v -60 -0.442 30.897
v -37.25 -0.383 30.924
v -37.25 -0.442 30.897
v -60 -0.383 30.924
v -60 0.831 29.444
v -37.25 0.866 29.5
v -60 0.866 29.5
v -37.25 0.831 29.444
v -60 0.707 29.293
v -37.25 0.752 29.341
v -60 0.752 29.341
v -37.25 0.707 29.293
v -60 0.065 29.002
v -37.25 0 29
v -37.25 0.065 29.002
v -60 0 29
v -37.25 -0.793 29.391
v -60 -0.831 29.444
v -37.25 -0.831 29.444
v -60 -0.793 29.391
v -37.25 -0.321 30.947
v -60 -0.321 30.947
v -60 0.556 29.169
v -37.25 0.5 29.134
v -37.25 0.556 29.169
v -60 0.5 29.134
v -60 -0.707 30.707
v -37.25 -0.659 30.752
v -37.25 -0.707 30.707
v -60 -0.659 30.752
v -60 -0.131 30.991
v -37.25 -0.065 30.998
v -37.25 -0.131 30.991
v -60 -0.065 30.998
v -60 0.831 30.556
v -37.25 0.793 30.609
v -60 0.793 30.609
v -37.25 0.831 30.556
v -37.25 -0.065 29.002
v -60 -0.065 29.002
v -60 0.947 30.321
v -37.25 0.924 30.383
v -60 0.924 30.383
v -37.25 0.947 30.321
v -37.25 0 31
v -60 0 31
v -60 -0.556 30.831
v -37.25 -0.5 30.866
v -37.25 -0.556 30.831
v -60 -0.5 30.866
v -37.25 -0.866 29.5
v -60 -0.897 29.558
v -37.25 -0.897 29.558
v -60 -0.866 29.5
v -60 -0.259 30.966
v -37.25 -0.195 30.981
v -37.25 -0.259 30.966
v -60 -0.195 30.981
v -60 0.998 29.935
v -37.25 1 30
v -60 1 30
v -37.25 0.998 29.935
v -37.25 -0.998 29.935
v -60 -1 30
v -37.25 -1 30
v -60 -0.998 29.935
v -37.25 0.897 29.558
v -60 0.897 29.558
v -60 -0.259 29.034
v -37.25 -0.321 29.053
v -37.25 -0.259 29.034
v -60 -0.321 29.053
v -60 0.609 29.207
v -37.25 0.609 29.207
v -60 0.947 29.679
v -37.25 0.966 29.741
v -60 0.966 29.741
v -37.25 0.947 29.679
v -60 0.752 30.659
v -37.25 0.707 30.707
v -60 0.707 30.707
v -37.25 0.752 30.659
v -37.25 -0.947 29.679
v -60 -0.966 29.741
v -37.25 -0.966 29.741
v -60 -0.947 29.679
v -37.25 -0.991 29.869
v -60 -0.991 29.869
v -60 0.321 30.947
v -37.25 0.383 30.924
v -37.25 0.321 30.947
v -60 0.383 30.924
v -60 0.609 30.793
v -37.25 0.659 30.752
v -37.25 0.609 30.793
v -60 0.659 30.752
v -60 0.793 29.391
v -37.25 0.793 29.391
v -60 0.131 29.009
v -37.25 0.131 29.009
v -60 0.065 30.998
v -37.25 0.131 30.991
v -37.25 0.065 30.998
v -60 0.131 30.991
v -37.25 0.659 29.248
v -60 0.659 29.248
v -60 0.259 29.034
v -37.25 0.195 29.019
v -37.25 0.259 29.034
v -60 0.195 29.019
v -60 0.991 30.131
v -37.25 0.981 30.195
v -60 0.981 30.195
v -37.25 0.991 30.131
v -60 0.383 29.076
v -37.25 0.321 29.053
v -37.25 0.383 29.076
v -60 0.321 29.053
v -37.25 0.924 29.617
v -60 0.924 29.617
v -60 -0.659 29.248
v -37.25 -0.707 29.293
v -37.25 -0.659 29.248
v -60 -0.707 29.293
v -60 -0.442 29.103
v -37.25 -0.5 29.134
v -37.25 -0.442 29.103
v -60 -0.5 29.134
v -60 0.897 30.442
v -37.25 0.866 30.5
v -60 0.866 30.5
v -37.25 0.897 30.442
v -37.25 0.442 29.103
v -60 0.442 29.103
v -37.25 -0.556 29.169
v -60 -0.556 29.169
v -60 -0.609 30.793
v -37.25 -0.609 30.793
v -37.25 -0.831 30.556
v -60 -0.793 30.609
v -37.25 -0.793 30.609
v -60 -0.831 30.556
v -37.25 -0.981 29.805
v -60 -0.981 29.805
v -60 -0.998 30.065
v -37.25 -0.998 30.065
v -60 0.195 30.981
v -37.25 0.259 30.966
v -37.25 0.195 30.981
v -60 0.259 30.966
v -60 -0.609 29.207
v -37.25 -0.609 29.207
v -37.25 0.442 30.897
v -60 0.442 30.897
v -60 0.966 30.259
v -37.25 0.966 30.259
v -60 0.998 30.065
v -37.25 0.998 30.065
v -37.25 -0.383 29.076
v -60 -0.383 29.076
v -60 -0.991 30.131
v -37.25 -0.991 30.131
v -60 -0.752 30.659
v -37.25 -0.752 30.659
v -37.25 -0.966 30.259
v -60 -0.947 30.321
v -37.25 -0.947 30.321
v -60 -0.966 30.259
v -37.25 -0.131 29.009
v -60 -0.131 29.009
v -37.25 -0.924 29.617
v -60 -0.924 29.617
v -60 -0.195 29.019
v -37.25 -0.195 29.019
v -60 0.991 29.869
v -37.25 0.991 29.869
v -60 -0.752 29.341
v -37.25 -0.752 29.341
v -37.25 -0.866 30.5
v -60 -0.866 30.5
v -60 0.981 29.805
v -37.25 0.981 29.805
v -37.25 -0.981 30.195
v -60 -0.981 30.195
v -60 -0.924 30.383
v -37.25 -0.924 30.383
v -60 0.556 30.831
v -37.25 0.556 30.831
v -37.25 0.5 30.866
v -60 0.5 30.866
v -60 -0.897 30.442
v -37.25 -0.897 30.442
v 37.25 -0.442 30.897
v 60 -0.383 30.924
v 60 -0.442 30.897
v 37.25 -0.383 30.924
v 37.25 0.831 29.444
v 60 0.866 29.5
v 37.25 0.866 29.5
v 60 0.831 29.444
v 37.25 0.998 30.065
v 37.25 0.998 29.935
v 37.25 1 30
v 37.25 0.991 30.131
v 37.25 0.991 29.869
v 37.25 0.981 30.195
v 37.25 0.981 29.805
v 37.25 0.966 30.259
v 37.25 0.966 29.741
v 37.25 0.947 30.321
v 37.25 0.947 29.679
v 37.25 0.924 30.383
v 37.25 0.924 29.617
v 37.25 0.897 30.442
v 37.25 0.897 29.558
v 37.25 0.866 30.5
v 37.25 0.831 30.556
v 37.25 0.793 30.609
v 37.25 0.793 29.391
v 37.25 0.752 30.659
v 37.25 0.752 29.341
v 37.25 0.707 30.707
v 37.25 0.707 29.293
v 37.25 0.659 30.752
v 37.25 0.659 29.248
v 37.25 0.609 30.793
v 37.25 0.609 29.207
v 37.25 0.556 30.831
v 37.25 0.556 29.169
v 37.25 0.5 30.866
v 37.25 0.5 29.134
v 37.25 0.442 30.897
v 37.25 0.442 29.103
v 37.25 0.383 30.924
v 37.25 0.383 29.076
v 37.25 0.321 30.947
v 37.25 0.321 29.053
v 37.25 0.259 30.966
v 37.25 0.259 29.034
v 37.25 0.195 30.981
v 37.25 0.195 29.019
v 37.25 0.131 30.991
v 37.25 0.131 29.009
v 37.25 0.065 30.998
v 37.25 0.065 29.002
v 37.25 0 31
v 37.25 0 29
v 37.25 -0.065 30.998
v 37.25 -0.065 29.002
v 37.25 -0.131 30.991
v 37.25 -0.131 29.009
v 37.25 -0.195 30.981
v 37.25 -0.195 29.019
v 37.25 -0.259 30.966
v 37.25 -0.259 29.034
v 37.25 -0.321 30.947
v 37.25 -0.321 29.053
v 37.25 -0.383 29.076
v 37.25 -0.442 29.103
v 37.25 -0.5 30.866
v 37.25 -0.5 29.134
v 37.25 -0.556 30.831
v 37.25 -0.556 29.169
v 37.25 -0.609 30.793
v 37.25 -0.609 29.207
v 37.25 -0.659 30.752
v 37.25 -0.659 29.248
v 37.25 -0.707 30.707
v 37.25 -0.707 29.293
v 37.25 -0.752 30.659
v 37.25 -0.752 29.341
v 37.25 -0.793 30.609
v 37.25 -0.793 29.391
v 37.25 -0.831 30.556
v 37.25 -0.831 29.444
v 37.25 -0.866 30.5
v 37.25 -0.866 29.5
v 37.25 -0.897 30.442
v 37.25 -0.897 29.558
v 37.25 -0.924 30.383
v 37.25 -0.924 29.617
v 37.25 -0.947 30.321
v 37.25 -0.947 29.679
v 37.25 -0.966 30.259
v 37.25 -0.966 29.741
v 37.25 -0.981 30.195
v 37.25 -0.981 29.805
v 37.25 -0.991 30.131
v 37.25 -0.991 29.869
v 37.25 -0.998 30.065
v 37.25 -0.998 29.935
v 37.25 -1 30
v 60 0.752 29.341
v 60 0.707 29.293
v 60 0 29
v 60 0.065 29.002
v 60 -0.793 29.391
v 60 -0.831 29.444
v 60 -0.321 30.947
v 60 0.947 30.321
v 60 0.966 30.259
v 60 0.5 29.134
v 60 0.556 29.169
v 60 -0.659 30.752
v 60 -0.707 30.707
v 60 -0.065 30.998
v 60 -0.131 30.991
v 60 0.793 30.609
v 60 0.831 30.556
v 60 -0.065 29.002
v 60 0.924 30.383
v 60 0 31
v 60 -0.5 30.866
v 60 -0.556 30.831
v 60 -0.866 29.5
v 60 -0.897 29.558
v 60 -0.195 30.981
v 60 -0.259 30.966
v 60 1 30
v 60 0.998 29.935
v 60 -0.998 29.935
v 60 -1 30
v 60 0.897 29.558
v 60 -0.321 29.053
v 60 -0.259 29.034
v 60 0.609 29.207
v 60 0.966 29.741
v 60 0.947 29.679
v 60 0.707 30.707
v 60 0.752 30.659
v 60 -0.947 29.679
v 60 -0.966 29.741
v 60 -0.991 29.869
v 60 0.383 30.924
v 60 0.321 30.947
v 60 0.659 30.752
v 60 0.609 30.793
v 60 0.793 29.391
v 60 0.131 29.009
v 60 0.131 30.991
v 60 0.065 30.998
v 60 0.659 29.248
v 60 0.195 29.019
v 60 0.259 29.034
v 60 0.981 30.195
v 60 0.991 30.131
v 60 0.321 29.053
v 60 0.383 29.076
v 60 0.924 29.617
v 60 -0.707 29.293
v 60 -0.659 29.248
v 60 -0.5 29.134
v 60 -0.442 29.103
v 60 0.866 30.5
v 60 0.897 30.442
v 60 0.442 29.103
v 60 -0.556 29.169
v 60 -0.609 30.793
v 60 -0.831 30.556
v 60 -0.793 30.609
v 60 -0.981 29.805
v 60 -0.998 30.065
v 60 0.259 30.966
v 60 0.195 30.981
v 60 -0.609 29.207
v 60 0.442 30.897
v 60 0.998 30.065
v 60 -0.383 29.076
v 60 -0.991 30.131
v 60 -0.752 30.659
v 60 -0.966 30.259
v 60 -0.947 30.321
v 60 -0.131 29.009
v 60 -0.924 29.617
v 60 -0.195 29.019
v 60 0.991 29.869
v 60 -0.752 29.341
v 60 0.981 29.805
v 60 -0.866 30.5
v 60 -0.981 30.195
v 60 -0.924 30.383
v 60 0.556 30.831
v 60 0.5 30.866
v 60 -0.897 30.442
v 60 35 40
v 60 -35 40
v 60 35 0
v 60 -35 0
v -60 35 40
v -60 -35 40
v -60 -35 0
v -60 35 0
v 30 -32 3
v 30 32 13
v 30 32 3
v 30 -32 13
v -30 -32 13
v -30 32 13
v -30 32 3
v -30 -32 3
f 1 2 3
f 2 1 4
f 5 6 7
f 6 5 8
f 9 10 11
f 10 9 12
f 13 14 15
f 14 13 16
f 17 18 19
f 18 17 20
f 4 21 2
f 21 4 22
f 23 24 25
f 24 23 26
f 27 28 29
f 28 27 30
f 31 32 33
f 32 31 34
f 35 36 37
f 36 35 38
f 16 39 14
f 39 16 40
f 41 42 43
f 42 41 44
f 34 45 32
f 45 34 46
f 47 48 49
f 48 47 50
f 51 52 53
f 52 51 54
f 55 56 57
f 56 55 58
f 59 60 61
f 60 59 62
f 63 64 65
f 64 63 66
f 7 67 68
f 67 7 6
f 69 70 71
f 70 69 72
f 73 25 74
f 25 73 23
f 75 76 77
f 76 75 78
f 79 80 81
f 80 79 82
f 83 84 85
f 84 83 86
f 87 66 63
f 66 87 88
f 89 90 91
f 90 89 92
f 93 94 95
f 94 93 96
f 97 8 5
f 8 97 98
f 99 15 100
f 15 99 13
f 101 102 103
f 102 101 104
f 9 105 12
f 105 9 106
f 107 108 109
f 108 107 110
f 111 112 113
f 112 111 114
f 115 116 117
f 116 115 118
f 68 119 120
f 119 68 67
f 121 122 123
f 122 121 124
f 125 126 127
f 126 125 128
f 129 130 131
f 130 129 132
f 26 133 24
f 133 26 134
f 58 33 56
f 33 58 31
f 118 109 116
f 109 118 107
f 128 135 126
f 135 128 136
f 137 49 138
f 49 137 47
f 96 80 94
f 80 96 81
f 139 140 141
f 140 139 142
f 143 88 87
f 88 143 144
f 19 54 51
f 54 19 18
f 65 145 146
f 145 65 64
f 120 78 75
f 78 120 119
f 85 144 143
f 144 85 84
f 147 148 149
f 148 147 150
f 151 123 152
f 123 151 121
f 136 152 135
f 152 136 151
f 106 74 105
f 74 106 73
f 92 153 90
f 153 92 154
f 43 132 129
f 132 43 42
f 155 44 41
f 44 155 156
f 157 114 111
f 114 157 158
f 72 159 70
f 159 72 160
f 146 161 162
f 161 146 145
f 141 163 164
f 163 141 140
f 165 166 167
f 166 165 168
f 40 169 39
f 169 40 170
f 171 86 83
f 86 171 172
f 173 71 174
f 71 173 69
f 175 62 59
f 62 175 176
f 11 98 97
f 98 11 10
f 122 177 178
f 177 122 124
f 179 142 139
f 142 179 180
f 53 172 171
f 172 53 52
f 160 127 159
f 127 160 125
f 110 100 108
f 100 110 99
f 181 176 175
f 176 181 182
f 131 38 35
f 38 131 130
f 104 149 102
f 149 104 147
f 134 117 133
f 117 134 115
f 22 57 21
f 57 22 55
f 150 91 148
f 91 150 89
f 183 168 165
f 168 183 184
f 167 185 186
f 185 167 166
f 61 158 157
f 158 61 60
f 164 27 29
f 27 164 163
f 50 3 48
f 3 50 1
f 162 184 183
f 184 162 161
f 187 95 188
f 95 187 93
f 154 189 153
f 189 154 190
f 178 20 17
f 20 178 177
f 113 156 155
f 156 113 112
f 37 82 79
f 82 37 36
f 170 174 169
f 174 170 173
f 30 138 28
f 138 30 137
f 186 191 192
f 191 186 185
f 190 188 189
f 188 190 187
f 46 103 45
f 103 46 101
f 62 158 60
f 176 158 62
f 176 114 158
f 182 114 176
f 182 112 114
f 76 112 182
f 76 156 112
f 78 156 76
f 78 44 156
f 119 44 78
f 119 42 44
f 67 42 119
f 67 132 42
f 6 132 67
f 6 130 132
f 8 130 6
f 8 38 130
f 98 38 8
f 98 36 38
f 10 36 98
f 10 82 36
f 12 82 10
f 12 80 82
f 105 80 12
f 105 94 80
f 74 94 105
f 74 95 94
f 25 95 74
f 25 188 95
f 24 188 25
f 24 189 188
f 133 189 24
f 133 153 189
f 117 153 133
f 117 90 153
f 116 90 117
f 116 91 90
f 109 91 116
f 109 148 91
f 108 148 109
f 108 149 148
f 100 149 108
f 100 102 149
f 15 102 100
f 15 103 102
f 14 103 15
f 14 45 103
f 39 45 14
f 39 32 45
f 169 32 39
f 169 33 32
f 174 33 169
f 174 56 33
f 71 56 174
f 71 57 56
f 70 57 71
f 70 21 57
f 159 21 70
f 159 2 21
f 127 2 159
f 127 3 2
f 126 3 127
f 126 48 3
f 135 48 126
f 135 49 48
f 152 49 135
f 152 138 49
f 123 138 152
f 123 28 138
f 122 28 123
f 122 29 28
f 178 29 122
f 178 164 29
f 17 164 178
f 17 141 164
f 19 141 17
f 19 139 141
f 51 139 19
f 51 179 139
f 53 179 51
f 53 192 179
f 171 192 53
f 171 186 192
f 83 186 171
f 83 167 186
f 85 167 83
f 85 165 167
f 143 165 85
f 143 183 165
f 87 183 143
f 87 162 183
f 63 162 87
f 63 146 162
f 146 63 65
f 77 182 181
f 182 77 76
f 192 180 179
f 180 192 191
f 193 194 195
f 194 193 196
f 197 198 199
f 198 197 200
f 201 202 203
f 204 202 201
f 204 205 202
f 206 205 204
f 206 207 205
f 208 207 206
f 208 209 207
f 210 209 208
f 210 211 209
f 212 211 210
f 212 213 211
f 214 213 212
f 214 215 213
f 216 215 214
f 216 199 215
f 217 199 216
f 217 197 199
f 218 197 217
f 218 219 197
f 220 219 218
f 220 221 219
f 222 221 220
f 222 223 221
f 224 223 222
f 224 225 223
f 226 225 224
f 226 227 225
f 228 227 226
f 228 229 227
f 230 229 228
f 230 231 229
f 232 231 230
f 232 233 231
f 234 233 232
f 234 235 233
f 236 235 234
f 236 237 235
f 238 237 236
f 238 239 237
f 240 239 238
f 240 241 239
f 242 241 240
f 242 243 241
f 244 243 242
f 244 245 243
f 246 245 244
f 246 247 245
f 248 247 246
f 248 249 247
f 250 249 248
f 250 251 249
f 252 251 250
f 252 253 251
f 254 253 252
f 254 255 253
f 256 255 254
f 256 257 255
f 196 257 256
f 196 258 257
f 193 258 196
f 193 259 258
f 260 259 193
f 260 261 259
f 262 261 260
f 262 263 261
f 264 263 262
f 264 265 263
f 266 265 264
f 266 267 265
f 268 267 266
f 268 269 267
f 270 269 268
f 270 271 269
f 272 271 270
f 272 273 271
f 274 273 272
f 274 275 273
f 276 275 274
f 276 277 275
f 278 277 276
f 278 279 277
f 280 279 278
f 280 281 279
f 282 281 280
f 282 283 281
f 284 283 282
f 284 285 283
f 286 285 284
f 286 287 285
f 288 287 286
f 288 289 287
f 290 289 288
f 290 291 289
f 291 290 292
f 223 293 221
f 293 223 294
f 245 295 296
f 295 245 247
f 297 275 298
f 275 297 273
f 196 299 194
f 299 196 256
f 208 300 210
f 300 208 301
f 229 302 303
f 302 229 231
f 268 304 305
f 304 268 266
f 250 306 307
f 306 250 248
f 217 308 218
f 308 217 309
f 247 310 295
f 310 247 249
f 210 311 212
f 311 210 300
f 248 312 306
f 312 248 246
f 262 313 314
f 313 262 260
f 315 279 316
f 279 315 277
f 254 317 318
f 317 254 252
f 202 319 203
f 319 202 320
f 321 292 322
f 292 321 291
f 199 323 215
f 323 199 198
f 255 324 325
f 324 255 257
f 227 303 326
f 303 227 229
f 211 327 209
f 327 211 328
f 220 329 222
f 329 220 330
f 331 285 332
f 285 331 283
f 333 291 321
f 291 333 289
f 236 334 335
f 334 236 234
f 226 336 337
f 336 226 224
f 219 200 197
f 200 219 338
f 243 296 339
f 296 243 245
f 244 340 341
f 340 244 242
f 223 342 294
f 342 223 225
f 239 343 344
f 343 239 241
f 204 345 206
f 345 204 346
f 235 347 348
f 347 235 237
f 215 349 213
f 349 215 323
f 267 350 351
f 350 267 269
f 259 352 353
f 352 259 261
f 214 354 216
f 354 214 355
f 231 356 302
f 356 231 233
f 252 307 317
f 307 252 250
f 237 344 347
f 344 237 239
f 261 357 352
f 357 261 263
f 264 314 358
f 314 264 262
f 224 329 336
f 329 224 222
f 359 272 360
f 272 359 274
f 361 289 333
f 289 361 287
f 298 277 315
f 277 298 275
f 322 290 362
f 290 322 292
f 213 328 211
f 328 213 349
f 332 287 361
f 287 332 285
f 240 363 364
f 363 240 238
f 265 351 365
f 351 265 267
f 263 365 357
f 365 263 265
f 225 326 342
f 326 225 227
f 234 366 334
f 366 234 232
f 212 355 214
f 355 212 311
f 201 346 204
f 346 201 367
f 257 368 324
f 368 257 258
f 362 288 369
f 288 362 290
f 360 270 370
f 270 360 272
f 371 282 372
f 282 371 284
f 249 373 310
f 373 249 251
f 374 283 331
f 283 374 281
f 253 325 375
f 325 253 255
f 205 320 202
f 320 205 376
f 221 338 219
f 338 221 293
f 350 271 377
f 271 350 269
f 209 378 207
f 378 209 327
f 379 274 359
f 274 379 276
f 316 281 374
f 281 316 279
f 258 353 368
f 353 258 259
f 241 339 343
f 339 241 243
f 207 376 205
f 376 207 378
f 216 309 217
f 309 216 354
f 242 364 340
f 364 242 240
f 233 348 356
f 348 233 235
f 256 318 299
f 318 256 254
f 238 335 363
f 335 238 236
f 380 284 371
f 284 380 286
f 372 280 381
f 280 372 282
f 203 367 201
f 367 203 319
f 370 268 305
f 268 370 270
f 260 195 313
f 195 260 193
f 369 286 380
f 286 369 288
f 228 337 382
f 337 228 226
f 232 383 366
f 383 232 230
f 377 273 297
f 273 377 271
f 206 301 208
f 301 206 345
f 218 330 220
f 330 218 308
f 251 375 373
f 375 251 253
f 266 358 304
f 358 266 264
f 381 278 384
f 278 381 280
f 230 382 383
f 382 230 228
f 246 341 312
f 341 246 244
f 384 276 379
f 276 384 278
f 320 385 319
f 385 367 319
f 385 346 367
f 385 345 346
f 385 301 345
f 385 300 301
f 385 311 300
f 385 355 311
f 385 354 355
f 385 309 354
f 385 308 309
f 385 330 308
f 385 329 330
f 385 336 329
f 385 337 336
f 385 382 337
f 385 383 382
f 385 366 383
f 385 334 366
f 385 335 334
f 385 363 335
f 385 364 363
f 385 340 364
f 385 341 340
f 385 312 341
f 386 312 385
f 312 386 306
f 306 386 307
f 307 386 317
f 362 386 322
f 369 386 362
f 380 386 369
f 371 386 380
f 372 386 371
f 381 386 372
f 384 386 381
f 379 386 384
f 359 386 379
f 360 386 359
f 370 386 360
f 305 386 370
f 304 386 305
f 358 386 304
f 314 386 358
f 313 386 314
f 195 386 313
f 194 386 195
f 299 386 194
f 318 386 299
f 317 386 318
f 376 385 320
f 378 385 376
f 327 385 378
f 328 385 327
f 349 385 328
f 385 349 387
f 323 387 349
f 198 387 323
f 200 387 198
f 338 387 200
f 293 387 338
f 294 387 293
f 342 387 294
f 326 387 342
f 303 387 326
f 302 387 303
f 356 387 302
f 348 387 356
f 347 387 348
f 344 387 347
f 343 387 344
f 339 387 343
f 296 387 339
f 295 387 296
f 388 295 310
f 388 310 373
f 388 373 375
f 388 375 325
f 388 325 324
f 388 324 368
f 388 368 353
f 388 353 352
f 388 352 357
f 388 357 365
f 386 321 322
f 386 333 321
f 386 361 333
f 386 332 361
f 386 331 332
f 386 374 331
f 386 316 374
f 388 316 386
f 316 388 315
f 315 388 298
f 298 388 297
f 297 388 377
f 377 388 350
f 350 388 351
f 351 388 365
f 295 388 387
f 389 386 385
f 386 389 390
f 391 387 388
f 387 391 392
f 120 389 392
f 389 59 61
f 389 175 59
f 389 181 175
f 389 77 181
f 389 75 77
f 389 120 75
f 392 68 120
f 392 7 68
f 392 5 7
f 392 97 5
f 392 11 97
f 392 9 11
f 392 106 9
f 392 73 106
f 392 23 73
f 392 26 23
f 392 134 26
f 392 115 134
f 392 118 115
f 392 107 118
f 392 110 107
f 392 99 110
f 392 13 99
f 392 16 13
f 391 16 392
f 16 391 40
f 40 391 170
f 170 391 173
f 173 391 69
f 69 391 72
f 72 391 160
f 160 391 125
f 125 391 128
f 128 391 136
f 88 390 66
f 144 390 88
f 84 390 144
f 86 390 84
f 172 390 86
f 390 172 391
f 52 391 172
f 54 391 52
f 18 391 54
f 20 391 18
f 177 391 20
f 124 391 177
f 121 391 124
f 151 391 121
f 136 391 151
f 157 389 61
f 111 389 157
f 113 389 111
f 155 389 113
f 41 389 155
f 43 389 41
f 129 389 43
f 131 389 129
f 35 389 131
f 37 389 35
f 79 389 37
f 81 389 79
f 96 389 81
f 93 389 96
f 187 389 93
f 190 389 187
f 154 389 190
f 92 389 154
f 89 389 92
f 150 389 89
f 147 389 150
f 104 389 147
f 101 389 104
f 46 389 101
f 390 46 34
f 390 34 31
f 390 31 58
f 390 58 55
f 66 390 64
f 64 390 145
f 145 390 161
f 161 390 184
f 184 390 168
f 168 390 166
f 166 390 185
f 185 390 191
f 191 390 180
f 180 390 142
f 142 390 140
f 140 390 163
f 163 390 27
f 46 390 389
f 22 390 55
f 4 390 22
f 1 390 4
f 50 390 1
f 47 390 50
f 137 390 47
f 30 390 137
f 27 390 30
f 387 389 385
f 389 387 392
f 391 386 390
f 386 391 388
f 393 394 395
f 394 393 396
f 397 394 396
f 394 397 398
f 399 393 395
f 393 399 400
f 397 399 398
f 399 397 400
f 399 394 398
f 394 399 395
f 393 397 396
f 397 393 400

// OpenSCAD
// Mini horizontal gel-electrophoresis box - buffer tank
// Print orientation: open top facing up (+Z), resting on XY plane at z = 0

// ---------------- Parameters ----------------
tank_x      = 120;   // outer length in X (mm)
tank_y      = 70;    // outer width in Y (mm)
tank_h      = 40;    // outer height in Z (mm)
wall        = 3;     // wall thickness (mm)
floor       = 3;     // floor thickness (mm)

platform_x  = 60;    // platform length in X (mm), centred
platform_y  = tank_y - 2 * wall;  // platform spans full inner width
platform_top = floor + 10;  // platform top height (z = 13)

hole_d      = 2;     // electrode hole diameter (mm)
hole_y      = 0;     // electrode hole Y position (mm)
hole_z      = 30;    // electrode hole Z position (mm)

eps         = 0.5;   // cutter overshoot past faces (mm)
$fn         = 96;    // curve resolution

// ---------------- Derived ----------------
inner_x = tank_x - 2 * wall;   // 114 mm
inner_z = tank_h - floor;      // 37 mm (floor at bottom, open top)

// ---------------- Model ----------------
difference() {
    // Main tank body: solid block with open top
    translate([-tank_x / 2, -tank_y / 2, 0])
        cube([tank_x, tank_y, tank_h]);

    // Raised platform for gel tray, centred in X
    translate([-platform_x / 2, -platform_y / 2, floor])
        cube([platform_x, platform_y, platform_top - floor]);

    // Horizontal electrode holes through each end wall, along X
    for (sx = [-1, 1])
        translate([sx > 0 ? tank_x / 2 - wall : -tank_x / 2 + wall,
                   hole_y, hole_z])
            rotate([0, 90, 0])
                cylinder(d = hole_d, h = tank_h - eps, center = true);
}
